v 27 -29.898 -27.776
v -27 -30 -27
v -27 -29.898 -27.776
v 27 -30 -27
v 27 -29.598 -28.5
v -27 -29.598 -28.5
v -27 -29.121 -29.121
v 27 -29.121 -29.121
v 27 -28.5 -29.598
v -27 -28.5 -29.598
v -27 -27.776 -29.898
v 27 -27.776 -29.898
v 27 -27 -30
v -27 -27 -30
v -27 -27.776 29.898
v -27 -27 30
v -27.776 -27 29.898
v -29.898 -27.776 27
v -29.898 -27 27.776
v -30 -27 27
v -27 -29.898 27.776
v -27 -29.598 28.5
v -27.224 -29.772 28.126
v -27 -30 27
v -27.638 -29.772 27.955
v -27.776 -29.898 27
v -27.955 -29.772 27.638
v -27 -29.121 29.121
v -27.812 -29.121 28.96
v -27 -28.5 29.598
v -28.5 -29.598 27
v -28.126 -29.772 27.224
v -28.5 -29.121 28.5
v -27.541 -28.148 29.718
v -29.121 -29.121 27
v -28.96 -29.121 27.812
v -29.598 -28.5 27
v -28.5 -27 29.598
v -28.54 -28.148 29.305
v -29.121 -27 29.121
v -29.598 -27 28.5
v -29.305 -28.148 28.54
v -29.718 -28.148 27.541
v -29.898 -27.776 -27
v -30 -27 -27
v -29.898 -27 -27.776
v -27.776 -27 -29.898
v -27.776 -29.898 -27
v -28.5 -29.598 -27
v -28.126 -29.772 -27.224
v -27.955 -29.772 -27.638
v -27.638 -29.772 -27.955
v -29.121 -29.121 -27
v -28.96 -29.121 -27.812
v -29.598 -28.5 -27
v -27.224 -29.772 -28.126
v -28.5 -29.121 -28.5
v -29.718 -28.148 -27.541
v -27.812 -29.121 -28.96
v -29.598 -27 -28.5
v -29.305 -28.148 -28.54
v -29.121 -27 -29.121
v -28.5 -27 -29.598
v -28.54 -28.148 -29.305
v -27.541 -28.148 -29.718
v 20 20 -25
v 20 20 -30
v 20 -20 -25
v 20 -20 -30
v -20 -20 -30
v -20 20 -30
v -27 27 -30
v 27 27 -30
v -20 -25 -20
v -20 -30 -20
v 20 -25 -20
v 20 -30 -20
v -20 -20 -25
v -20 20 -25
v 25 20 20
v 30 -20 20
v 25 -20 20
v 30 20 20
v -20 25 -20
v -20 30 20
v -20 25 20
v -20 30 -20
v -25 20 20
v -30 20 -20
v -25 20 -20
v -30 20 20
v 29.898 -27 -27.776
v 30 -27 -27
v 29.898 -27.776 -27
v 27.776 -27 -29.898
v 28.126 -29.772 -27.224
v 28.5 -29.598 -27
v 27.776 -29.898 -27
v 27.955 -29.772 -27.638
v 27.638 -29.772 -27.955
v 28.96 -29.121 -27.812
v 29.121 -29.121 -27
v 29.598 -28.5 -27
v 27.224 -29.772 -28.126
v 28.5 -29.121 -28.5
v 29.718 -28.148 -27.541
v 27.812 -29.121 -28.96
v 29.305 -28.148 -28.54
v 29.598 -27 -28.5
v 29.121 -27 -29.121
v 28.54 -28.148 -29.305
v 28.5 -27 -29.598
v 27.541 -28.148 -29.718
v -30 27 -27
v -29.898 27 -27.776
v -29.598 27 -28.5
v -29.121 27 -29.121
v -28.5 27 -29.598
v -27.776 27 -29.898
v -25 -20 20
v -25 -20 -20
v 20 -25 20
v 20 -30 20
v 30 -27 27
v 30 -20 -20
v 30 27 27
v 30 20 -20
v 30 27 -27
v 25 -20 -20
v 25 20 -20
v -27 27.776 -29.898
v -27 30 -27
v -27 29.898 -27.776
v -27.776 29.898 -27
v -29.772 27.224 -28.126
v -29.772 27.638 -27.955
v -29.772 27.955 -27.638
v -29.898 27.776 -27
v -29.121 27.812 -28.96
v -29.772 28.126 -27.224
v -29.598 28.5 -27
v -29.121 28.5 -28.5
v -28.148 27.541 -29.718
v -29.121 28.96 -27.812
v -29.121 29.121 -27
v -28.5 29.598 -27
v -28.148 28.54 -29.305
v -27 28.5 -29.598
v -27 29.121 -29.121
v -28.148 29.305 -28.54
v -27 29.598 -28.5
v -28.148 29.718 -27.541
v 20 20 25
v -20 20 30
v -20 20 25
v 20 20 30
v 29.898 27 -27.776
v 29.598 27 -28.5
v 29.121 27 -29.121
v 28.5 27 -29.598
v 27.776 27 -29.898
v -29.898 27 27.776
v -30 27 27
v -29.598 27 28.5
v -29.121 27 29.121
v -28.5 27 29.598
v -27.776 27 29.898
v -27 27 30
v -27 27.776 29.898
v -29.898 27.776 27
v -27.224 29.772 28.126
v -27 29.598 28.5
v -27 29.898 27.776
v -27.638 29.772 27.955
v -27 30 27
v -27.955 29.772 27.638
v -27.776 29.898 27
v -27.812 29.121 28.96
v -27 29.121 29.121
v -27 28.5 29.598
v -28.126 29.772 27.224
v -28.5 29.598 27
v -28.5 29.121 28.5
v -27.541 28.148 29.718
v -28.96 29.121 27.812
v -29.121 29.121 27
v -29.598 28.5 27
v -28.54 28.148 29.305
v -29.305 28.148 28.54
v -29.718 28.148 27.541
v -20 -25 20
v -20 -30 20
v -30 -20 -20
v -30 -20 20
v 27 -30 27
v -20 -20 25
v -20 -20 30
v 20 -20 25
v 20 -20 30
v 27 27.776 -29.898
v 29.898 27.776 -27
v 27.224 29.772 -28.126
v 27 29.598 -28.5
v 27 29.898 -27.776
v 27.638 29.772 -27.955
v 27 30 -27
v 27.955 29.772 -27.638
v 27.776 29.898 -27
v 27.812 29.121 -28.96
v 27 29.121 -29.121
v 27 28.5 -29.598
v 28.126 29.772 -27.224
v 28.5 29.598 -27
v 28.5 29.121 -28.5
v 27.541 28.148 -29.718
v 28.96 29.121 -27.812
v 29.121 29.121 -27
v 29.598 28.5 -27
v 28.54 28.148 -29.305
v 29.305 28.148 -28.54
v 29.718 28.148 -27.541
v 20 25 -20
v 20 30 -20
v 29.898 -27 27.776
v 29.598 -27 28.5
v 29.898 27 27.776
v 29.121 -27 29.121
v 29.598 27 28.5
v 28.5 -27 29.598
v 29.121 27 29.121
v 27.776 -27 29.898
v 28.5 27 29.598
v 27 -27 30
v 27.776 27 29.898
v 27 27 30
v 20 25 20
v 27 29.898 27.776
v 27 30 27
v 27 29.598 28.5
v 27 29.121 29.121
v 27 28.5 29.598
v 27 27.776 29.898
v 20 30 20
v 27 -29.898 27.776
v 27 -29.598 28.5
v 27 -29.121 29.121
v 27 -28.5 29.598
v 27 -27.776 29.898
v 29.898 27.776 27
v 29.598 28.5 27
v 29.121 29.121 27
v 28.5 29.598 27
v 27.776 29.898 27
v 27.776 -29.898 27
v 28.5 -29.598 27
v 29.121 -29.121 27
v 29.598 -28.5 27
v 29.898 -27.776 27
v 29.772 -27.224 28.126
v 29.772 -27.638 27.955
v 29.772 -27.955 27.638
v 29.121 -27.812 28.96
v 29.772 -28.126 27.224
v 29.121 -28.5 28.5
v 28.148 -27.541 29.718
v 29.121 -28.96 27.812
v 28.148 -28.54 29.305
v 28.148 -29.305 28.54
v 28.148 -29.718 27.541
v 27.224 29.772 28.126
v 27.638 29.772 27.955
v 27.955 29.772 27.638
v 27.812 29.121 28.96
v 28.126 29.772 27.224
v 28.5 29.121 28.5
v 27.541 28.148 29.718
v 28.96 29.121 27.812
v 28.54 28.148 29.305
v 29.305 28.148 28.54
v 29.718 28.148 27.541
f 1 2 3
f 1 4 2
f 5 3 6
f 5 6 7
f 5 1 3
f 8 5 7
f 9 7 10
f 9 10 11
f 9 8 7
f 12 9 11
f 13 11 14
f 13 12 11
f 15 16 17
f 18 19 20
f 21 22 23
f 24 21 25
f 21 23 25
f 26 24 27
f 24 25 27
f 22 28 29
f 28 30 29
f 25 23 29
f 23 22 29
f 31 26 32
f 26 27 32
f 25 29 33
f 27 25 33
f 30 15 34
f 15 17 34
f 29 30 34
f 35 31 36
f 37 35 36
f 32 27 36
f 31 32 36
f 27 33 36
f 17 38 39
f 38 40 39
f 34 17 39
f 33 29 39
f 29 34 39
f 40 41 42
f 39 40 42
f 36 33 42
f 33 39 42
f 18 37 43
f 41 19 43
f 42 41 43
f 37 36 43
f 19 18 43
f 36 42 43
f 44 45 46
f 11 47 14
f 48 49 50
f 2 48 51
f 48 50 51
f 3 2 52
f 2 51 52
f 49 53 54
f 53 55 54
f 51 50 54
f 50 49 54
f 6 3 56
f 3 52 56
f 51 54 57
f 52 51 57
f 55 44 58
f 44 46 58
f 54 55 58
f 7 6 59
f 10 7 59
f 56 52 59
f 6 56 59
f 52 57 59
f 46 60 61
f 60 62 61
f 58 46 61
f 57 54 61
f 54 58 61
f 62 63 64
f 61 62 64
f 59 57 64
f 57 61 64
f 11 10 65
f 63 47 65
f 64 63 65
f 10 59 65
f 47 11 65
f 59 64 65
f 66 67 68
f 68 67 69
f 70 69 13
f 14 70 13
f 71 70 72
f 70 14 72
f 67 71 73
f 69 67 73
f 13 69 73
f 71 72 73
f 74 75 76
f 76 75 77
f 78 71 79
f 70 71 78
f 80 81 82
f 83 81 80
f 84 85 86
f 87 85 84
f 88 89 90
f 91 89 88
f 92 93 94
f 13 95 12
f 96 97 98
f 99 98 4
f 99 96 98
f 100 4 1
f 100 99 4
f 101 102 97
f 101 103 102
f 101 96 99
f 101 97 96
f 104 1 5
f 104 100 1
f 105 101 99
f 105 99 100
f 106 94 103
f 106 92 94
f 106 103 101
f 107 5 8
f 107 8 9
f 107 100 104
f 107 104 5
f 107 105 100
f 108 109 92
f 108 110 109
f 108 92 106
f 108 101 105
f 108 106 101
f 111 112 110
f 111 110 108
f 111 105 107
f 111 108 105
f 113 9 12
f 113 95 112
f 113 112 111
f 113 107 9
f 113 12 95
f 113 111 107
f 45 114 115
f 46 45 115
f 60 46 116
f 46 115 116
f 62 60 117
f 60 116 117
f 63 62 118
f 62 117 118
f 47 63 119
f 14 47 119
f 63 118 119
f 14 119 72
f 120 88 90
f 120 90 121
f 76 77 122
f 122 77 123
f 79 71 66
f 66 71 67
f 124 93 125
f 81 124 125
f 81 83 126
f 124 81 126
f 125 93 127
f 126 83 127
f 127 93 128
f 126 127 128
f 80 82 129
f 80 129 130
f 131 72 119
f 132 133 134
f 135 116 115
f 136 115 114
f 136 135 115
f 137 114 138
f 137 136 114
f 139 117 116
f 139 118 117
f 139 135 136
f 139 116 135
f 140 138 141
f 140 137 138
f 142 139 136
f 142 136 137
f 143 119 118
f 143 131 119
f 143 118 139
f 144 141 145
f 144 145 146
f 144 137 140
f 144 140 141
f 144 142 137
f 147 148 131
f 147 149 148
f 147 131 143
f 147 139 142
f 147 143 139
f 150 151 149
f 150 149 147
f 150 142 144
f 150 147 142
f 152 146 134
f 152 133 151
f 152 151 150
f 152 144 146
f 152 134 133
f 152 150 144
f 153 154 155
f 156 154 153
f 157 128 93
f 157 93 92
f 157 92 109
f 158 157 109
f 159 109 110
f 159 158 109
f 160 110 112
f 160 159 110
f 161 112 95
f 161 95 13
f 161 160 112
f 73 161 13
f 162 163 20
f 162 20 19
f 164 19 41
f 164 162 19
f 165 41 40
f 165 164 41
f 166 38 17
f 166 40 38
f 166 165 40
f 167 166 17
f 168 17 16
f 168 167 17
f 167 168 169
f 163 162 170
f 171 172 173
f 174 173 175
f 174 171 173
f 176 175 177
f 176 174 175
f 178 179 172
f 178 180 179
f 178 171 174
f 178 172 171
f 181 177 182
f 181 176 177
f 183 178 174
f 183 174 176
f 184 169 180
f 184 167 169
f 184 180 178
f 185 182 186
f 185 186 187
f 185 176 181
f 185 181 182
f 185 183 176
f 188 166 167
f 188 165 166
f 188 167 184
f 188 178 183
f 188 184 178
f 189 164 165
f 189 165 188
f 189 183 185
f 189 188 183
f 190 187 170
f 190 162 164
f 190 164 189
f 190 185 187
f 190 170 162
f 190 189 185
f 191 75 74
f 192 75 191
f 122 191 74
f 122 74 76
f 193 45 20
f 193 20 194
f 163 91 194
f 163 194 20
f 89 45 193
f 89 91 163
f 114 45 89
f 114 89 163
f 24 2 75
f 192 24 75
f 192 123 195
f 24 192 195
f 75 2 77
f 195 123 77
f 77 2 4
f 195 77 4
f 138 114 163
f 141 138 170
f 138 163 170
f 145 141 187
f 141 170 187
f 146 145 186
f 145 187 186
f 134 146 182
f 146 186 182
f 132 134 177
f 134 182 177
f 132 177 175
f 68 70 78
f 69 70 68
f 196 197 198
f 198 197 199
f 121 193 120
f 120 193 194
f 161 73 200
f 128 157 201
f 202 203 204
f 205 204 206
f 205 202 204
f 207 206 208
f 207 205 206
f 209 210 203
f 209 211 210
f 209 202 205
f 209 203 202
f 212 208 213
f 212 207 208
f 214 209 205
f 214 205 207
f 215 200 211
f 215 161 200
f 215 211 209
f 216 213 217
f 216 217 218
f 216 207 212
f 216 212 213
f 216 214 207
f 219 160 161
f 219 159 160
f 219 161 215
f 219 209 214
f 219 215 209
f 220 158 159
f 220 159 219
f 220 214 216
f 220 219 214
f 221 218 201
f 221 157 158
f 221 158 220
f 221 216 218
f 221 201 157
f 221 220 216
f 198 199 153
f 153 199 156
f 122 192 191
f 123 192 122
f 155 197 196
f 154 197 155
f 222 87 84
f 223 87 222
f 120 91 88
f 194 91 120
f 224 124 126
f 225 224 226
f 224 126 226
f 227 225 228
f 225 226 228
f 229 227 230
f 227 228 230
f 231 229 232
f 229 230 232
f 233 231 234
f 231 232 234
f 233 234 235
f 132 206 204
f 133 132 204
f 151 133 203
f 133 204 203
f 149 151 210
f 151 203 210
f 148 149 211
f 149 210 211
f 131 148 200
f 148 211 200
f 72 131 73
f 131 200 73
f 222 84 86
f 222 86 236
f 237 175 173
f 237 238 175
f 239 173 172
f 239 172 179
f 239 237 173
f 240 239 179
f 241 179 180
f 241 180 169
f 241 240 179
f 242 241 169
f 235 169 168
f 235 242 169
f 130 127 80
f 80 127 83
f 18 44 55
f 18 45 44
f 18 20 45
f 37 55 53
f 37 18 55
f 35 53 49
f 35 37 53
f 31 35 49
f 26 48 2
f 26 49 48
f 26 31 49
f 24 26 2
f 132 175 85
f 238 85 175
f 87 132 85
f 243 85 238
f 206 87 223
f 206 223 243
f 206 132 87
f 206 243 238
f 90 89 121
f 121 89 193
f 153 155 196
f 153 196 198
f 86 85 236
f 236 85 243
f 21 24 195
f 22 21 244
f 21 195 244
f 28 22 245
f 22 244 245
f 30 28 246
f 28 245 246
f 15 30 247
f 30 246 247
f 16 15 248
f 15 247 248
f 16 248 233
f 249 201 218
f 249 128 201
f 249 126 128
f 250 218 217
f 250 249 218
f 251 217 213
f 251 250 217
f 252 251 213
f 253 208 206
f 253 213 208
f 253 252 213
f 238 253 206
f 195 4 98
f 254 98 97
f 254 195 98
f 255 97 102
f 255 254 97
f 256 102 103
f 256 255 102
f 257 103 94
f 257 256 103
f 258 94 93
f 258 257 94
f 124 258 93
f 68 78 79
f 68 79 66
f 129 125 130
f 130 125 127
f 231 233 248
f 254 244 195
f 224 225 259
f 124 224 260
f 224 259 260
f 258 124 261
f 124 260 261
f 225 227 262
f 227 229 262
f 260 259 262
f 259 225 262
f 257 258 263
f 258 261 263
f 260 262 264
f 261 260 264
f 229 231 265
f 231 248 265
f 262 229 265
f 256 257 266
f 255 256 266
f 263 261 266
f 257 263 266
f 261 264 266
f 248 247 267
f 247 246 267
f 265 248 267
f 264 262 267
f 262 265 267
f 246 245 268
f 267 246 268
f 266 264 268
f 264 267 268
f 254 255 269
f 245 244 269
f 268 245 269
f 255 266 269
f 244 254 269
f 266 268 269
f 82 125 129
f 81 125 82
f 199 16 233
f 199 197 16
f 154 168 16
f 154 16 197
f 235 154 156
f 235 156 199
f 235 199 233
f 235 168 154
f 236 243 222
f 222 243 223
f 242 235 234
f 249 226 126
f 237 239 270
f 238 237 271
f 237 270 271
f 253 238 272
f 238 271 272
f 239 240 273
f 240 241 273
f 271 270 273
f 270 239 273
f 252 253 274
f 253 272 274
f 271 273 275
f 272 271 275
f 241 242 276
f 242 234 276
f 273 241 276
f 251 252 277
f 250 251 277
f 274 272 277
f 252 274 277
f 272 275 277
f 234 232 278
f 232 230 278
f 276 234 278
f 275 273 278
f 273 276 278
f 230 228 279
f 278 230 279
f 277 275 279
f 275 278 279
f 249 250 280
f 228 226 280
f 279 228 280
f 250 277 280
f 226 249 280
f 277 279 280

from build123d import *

# Parameters (mm, degrees)
DODANIE_WYCI_GNI_CIE1_DEPTH      = 30
DODANIE_WYCI_GNI_CIE1_DEPTH_BACK = 30
SZKIC1_W                         = 60
SZKIC1_H                         = 60
ZAOKR_GLENIE1_R                  = 3
SZKIC2_W                         = 40
SZKIC2_H                         = 40
WYTNIJ_WYCI_GNI_CIE1_DEPTH       = 5
SZYK_KO_OWY1_COUNT               = 4
SZYK_KO_OWY2_COPY_1_SKETCH_W     = 40
SZYK_KO_OWY2_COPY_1_SKETCH_H     = 40
SZYK_KO_OWY2_COPY_1_DEPTH        = 5
SZYK_KO_OWY2_COPY_2_SKETCH_W     = 40
SZYK_KO_OWY2_COPY_2_SKETCH_H     = 40
SZYK_KO_OWY2_COPY_2_DEPTH        = 5
SZYK_KO_OWY2_COPY_3_SKETCH_W     = 40
SZYK_KO_OWY2_COPY_3_SKETCH_H     = 40
SZYK_KO_OWY2_COPY_3_DEPTH        = 5
SZYK_KO_OWY2_COPY_4_SKETCH_W     = 40
SZYK_KO_OWY2_COPY_4_SKETCH_H     = 40
SZYK_KO_OWY2_COPY_4_DEPTH        = 5
SZYK_KO_OWY2_COPY_5_SKETCH_W     = 40
SZYK_KO_OWY2_COPY_5_SKETCH_H     = 40
SZYK_KO_OWY2_COPY_5_DEPTH        = 5
SZYK_KO_OWY2_COPY_6_SKETCH_W     = 40
SZYK_KO_OWY2_COPY_6_SKETCH_H     = 40
SZYK_KO_OWY2_COPY_6_DEPTH        = 5
SZYK_KO_OWY2_COPY_7_SKETCH_W     = 40
SZYK_KO_OWY2_COPY_7_SKETCH_H     = 40
SZYK_KO_OWY2_COPY_7_DEPTH        = 5
SZYK_KO_OWY2_COPY_8_SKETCH_W     = 40
SZYK_KO_OWY2_COPY_8_SKETCH_H     = 40
SZYK_KO_OWY2_COPY_8_DEPTH        = 5
SZYK_KO_OWY2_COPY_9_SKETCH_W     = 40
SZYK_KO_OWY2_COPY_9_SKETCH_H     = 40
SZYK_KO_OWY2_COPY_9_DEPTH        = 5
SZYK_KO_OWY2_COPY_10_SKETCH_W    = 40
SZYK_KO_OWY2_COPY_10_SKETCH_H    = 40
SZYK_KO_OWY2_COPY_10_DEPTH       = 5
SZYK_KO_OWY2_COPY_11_SKETCH_W    = 40
SZYK_KO_OWY2_COPY_11_SKETCH_H    = 40
SZYK_KO_OWY2_COPY_11_DEPTH       = 5
SZYK_KO_OWY2_COPY_12_SKETCH_W    = 40
SZYK_KO_OWY2_COPY_12_SKETCH_H    = 40
SZYK_KO_OWY2_COPY_12_DEPTH       = 5


with BuildPart() as part:
    # Szkic1 → Dodanie-wyciągnięcie1 (new, two sides: drawn at the far end of the back side and taken through both)
    with BuildSketch(Plane.XY.offset(-DODANIE_WYCI_GNI_CIE1_DEPTH_BACK)):
        Rectangle(SZKIC1_W, SZKIC1_H)
    extrude(amount=DODANIE_WYCI_GNI_CIE1_DEPTH + DODANIE_WYCI_GNI_CIE1_DEPTH_BACK)

    # Zaokrąglenie1
    zaokr_glenie1_edges = [part.edges().sort_by_distance(p)[0] for p in [
        (-30, -30, 0),
        (0, -30, -30),
        (-30, 0, -30),
        (30, 0, -30),
        (30, -30, 0),
        (0, 30, -30),
        (30, 30, 0),
        (-30, 30, 0),
        (0, 30, 30),
        (30, 0, 30),
        (0, -30, 30),
        (-30, 0, 30),
    ]]
    fillet(zaokr_glenie1_edges, radius=ZAOKR_GLENIE1_R)

    # Szkic2 → Wytnij-wyciągnięcie1 (cut)
    with BuildSketch(Plane.XY.offset(30)):
        Rectangle(SZKIC2_W, SZKIC2_H)
    wytnij_wyci_gni_cie1 = extrude(amount=-WYTNIJ_WYCI_GNI_CIE1_DEPTH, mode=Mode.SUBTRACT)

    # Szyk kołowy1: Wytnij-wyciągnięcie1 ×4 about axis
    szyk_ko_owy1_axis = Axis((-33, 0, 0), (1, 0, 0))
    for i in range(1, SZYK_KO_OWY1_COUNT):
        add(wytnij_wyci_gni_cie1.rotate(szyk_ko_owy1_axis, i * 360 / SZYK_KO_OWY1_COUNT), mode=Mode.SUBTRACT)

    # Szyk kołowy2 copy 1 sketch → Szyk kołowy2 copy 1 (cut)
    with BuildSketch(Plane.YZ.offset(30)):
        Rectangle(SZYK_KO_OWY2_COPY_1_SKETCH_W, SZYK_KO_OWY2_COPY_1_SKETCH_H)
    extrude(amount=-SZYK_KO_OWY2_COPY_1_DEPTH, mode=Mode.SUBTRACT)

    # Szyk kołowy2 copy 2 sketch → Szyk kołowy2 copy 2 (cut)
    with BuildSketch(Plane(origin=(0, 30, 0), x_dir=(-1, 0, 0), z_dir=(0, 1, 0))):
        Rectangle(SZYK_KO_OWY2_COPY_2_SKETCH_W, SZYK_KO_OWY2_COPY_2_SKETCH_H)
    extrude(amount=-SZYK_KO_OWY2_COPY_2_DEPTH, mode=Mode.SUBTRACT)

    # Szyk kołowy2 copy 3 sketch → Szyk kołowy2 copy 3 (cut)
    with BuildSketch(Plane(origin=(-30, 0, 0), x_dir=(0, -1, 0), z_dir=(-1, 0, 0))):
        Rectangle(SZYK_KO_OWY2_COPY_3_SKETCH_W, SZYK_KO_OWY2_COPY_3_SKETCH_H)
    extrude(amount=-SZYK_KO_OWY2_COPY_3_DEPTH, mode=Mode.SUBTRACT)

    # Szyk kołowy2 copy 4 sketch → Szyk kołowy2 copy 4 (cut)
    with BuildSketch(Plane.YX.offset(30)):
        Rectangle(SZYK_KO_OWY2_COPY_4_SKETCH_W, SZYK_KO_OWY2_COPY_4_SKETCH_H)
    extrude(amount=-SZYK_KO_OWY2_COPY_4_DEPTH, mode=Mode.SUBTRACT)

    # Szyk kołowy2 copy 5 sketch → Szyk kołowy2 copy 5 (cut)
    with BuildSketch(Plane(origin=(0, 0, -30), x_dir=(-1, 0, 0), z_dir=(0, 0, -1))):
        Rectangle(SZYK_KO_OWY2_COPY_5_SKETCH_W, SZYK_KO_OWY2_COPY_5_SKETCH_H)
    extrude(amount=-SZYK_KO_OWY2_COPY_5_DEPTH, mode=Mode.SUBTRACT)

    # Szyk kołowy2 copy 6 sketch → Szyk kołowy2 copy 6 (cut)
    with BuildSketch(Plane(origin=(0, 0, -30), x_dir=(0, -1, 0), z_dir=(0, 0, -1))):
        Rectangle(SZYK_KO_OWY2_COPY_6_SKETCH_W, SZYK_KO_OWY2_COPY_6_SKETCH_H)
    extrude(amount=-SZYK_KO_OWY2_COPY_6_DEPTH, mode=Mode.SUBTRACT)

    # Szyk kołowy2 copy 7 sketch → Szyk kołowy2 copy 7 (cut)
    with BuildSketch(Plane(origin=(-30, 0, 0), x_dir=(0, 1, 0), z_dir=(-1, 0, 0))):
        Rectangle(SZYK_KO_OWY2_COPY_7_SKETCH_W, SZYK_KO_OWY2_COPY_7_SKETCH_H)
    extrude(amount=-SZYK_KO_OWY2_COPY_7_DEPTH, mode=Mode.SUBTRACT)

    # Szyk kołowy2 copy 8 sketch → Szyk kołowy2 copy 8 (cut)
    with BuildSketch(Plane(origin=(0, -30, 0), x_dir=(-1, 0, 0), z_dir=(0, -1, 0))):
        Rectangle(SZYK_KO_OWY2_COPY_8_SKETCH_W, SZYK_KO_OWY2_COPY_8_SKETCH_H)
    extrude(amount=-SZYK_KO_OWY2_COPY_8_DEPTH, mode=Mode.SUBTRACT)

    # Szyk kołowy2 copy 9 sketch → Szyk kołowy2 copy 9 (cut)
    with BuildSketch(Plane(origin=(30, 0, 0), x_dir=(0, -1, 0), z_dir=(1, 0, 0))):
        Rectangle(SZYK_KO_OWY2_COPY_9_SKETCH_W, SZYK_KO_OWY2_COPY_9_SKETCH_H)
    extrude(amount=-SZYK_KO_OWY2_COPY_9_DEPTH, mode=Mode.SUBTRACT)

    # Szyk kołowy2 copy 10 sketch → Szyk kołowy2 copy 10 (cut)
    with BuildSketch(Plane(origin=(0, 0, 30), x_dir=(0, 1, 0), z_dir=(0, 0, 1))):
        Rectangle(SZYK_KO_OWY2_COPY_10_SKETCH_W, SZYK_KO_OWY2_COPY_10_SKETCH_H)
    extrude(amount=-SZYK_KO_OWY2_COPY_10_DEPTH, mode=Mode.SUBTRACT)

    # Szyk kołowy2 copy 11 sketch → Szyk kołowy2 copy 11 (cut)
    with BuildSketch(Plane(origin=(0, 0, 30), x_dir=(-1, 0, 0), z_dir=(0, 0, 1))):
        Rectangle(SZYK_KO_OWY2_COPY_11_SKETCH_W, SZYK_KO_OWY2_COPY_11_SKETCH_H)
    extrude(amount=-SZYK_KO_OWY2_COPY_11_DEPTH, mode=Mode.SUBTRACT)

    # Szyk kołowy2 copy 12 sketch → Szyk kołowy2 copy 12 (cut)
    with BuildSketch(Plane(origin=(0, 0, 30), x_dir=(0, -1, 0), z_dir=(0, 0, 1))):
        Rectangle(SZYK_KO_OWY2_COPY_12_SKETCH_W, SZYK_KO_OWY2_COPY_12_SKETCH_H)
    extrude(amount=-SZYK_KO_OWY2_COPY_12_DEPTH, mode=Mode.SUBTRACT)


solid = part.part
